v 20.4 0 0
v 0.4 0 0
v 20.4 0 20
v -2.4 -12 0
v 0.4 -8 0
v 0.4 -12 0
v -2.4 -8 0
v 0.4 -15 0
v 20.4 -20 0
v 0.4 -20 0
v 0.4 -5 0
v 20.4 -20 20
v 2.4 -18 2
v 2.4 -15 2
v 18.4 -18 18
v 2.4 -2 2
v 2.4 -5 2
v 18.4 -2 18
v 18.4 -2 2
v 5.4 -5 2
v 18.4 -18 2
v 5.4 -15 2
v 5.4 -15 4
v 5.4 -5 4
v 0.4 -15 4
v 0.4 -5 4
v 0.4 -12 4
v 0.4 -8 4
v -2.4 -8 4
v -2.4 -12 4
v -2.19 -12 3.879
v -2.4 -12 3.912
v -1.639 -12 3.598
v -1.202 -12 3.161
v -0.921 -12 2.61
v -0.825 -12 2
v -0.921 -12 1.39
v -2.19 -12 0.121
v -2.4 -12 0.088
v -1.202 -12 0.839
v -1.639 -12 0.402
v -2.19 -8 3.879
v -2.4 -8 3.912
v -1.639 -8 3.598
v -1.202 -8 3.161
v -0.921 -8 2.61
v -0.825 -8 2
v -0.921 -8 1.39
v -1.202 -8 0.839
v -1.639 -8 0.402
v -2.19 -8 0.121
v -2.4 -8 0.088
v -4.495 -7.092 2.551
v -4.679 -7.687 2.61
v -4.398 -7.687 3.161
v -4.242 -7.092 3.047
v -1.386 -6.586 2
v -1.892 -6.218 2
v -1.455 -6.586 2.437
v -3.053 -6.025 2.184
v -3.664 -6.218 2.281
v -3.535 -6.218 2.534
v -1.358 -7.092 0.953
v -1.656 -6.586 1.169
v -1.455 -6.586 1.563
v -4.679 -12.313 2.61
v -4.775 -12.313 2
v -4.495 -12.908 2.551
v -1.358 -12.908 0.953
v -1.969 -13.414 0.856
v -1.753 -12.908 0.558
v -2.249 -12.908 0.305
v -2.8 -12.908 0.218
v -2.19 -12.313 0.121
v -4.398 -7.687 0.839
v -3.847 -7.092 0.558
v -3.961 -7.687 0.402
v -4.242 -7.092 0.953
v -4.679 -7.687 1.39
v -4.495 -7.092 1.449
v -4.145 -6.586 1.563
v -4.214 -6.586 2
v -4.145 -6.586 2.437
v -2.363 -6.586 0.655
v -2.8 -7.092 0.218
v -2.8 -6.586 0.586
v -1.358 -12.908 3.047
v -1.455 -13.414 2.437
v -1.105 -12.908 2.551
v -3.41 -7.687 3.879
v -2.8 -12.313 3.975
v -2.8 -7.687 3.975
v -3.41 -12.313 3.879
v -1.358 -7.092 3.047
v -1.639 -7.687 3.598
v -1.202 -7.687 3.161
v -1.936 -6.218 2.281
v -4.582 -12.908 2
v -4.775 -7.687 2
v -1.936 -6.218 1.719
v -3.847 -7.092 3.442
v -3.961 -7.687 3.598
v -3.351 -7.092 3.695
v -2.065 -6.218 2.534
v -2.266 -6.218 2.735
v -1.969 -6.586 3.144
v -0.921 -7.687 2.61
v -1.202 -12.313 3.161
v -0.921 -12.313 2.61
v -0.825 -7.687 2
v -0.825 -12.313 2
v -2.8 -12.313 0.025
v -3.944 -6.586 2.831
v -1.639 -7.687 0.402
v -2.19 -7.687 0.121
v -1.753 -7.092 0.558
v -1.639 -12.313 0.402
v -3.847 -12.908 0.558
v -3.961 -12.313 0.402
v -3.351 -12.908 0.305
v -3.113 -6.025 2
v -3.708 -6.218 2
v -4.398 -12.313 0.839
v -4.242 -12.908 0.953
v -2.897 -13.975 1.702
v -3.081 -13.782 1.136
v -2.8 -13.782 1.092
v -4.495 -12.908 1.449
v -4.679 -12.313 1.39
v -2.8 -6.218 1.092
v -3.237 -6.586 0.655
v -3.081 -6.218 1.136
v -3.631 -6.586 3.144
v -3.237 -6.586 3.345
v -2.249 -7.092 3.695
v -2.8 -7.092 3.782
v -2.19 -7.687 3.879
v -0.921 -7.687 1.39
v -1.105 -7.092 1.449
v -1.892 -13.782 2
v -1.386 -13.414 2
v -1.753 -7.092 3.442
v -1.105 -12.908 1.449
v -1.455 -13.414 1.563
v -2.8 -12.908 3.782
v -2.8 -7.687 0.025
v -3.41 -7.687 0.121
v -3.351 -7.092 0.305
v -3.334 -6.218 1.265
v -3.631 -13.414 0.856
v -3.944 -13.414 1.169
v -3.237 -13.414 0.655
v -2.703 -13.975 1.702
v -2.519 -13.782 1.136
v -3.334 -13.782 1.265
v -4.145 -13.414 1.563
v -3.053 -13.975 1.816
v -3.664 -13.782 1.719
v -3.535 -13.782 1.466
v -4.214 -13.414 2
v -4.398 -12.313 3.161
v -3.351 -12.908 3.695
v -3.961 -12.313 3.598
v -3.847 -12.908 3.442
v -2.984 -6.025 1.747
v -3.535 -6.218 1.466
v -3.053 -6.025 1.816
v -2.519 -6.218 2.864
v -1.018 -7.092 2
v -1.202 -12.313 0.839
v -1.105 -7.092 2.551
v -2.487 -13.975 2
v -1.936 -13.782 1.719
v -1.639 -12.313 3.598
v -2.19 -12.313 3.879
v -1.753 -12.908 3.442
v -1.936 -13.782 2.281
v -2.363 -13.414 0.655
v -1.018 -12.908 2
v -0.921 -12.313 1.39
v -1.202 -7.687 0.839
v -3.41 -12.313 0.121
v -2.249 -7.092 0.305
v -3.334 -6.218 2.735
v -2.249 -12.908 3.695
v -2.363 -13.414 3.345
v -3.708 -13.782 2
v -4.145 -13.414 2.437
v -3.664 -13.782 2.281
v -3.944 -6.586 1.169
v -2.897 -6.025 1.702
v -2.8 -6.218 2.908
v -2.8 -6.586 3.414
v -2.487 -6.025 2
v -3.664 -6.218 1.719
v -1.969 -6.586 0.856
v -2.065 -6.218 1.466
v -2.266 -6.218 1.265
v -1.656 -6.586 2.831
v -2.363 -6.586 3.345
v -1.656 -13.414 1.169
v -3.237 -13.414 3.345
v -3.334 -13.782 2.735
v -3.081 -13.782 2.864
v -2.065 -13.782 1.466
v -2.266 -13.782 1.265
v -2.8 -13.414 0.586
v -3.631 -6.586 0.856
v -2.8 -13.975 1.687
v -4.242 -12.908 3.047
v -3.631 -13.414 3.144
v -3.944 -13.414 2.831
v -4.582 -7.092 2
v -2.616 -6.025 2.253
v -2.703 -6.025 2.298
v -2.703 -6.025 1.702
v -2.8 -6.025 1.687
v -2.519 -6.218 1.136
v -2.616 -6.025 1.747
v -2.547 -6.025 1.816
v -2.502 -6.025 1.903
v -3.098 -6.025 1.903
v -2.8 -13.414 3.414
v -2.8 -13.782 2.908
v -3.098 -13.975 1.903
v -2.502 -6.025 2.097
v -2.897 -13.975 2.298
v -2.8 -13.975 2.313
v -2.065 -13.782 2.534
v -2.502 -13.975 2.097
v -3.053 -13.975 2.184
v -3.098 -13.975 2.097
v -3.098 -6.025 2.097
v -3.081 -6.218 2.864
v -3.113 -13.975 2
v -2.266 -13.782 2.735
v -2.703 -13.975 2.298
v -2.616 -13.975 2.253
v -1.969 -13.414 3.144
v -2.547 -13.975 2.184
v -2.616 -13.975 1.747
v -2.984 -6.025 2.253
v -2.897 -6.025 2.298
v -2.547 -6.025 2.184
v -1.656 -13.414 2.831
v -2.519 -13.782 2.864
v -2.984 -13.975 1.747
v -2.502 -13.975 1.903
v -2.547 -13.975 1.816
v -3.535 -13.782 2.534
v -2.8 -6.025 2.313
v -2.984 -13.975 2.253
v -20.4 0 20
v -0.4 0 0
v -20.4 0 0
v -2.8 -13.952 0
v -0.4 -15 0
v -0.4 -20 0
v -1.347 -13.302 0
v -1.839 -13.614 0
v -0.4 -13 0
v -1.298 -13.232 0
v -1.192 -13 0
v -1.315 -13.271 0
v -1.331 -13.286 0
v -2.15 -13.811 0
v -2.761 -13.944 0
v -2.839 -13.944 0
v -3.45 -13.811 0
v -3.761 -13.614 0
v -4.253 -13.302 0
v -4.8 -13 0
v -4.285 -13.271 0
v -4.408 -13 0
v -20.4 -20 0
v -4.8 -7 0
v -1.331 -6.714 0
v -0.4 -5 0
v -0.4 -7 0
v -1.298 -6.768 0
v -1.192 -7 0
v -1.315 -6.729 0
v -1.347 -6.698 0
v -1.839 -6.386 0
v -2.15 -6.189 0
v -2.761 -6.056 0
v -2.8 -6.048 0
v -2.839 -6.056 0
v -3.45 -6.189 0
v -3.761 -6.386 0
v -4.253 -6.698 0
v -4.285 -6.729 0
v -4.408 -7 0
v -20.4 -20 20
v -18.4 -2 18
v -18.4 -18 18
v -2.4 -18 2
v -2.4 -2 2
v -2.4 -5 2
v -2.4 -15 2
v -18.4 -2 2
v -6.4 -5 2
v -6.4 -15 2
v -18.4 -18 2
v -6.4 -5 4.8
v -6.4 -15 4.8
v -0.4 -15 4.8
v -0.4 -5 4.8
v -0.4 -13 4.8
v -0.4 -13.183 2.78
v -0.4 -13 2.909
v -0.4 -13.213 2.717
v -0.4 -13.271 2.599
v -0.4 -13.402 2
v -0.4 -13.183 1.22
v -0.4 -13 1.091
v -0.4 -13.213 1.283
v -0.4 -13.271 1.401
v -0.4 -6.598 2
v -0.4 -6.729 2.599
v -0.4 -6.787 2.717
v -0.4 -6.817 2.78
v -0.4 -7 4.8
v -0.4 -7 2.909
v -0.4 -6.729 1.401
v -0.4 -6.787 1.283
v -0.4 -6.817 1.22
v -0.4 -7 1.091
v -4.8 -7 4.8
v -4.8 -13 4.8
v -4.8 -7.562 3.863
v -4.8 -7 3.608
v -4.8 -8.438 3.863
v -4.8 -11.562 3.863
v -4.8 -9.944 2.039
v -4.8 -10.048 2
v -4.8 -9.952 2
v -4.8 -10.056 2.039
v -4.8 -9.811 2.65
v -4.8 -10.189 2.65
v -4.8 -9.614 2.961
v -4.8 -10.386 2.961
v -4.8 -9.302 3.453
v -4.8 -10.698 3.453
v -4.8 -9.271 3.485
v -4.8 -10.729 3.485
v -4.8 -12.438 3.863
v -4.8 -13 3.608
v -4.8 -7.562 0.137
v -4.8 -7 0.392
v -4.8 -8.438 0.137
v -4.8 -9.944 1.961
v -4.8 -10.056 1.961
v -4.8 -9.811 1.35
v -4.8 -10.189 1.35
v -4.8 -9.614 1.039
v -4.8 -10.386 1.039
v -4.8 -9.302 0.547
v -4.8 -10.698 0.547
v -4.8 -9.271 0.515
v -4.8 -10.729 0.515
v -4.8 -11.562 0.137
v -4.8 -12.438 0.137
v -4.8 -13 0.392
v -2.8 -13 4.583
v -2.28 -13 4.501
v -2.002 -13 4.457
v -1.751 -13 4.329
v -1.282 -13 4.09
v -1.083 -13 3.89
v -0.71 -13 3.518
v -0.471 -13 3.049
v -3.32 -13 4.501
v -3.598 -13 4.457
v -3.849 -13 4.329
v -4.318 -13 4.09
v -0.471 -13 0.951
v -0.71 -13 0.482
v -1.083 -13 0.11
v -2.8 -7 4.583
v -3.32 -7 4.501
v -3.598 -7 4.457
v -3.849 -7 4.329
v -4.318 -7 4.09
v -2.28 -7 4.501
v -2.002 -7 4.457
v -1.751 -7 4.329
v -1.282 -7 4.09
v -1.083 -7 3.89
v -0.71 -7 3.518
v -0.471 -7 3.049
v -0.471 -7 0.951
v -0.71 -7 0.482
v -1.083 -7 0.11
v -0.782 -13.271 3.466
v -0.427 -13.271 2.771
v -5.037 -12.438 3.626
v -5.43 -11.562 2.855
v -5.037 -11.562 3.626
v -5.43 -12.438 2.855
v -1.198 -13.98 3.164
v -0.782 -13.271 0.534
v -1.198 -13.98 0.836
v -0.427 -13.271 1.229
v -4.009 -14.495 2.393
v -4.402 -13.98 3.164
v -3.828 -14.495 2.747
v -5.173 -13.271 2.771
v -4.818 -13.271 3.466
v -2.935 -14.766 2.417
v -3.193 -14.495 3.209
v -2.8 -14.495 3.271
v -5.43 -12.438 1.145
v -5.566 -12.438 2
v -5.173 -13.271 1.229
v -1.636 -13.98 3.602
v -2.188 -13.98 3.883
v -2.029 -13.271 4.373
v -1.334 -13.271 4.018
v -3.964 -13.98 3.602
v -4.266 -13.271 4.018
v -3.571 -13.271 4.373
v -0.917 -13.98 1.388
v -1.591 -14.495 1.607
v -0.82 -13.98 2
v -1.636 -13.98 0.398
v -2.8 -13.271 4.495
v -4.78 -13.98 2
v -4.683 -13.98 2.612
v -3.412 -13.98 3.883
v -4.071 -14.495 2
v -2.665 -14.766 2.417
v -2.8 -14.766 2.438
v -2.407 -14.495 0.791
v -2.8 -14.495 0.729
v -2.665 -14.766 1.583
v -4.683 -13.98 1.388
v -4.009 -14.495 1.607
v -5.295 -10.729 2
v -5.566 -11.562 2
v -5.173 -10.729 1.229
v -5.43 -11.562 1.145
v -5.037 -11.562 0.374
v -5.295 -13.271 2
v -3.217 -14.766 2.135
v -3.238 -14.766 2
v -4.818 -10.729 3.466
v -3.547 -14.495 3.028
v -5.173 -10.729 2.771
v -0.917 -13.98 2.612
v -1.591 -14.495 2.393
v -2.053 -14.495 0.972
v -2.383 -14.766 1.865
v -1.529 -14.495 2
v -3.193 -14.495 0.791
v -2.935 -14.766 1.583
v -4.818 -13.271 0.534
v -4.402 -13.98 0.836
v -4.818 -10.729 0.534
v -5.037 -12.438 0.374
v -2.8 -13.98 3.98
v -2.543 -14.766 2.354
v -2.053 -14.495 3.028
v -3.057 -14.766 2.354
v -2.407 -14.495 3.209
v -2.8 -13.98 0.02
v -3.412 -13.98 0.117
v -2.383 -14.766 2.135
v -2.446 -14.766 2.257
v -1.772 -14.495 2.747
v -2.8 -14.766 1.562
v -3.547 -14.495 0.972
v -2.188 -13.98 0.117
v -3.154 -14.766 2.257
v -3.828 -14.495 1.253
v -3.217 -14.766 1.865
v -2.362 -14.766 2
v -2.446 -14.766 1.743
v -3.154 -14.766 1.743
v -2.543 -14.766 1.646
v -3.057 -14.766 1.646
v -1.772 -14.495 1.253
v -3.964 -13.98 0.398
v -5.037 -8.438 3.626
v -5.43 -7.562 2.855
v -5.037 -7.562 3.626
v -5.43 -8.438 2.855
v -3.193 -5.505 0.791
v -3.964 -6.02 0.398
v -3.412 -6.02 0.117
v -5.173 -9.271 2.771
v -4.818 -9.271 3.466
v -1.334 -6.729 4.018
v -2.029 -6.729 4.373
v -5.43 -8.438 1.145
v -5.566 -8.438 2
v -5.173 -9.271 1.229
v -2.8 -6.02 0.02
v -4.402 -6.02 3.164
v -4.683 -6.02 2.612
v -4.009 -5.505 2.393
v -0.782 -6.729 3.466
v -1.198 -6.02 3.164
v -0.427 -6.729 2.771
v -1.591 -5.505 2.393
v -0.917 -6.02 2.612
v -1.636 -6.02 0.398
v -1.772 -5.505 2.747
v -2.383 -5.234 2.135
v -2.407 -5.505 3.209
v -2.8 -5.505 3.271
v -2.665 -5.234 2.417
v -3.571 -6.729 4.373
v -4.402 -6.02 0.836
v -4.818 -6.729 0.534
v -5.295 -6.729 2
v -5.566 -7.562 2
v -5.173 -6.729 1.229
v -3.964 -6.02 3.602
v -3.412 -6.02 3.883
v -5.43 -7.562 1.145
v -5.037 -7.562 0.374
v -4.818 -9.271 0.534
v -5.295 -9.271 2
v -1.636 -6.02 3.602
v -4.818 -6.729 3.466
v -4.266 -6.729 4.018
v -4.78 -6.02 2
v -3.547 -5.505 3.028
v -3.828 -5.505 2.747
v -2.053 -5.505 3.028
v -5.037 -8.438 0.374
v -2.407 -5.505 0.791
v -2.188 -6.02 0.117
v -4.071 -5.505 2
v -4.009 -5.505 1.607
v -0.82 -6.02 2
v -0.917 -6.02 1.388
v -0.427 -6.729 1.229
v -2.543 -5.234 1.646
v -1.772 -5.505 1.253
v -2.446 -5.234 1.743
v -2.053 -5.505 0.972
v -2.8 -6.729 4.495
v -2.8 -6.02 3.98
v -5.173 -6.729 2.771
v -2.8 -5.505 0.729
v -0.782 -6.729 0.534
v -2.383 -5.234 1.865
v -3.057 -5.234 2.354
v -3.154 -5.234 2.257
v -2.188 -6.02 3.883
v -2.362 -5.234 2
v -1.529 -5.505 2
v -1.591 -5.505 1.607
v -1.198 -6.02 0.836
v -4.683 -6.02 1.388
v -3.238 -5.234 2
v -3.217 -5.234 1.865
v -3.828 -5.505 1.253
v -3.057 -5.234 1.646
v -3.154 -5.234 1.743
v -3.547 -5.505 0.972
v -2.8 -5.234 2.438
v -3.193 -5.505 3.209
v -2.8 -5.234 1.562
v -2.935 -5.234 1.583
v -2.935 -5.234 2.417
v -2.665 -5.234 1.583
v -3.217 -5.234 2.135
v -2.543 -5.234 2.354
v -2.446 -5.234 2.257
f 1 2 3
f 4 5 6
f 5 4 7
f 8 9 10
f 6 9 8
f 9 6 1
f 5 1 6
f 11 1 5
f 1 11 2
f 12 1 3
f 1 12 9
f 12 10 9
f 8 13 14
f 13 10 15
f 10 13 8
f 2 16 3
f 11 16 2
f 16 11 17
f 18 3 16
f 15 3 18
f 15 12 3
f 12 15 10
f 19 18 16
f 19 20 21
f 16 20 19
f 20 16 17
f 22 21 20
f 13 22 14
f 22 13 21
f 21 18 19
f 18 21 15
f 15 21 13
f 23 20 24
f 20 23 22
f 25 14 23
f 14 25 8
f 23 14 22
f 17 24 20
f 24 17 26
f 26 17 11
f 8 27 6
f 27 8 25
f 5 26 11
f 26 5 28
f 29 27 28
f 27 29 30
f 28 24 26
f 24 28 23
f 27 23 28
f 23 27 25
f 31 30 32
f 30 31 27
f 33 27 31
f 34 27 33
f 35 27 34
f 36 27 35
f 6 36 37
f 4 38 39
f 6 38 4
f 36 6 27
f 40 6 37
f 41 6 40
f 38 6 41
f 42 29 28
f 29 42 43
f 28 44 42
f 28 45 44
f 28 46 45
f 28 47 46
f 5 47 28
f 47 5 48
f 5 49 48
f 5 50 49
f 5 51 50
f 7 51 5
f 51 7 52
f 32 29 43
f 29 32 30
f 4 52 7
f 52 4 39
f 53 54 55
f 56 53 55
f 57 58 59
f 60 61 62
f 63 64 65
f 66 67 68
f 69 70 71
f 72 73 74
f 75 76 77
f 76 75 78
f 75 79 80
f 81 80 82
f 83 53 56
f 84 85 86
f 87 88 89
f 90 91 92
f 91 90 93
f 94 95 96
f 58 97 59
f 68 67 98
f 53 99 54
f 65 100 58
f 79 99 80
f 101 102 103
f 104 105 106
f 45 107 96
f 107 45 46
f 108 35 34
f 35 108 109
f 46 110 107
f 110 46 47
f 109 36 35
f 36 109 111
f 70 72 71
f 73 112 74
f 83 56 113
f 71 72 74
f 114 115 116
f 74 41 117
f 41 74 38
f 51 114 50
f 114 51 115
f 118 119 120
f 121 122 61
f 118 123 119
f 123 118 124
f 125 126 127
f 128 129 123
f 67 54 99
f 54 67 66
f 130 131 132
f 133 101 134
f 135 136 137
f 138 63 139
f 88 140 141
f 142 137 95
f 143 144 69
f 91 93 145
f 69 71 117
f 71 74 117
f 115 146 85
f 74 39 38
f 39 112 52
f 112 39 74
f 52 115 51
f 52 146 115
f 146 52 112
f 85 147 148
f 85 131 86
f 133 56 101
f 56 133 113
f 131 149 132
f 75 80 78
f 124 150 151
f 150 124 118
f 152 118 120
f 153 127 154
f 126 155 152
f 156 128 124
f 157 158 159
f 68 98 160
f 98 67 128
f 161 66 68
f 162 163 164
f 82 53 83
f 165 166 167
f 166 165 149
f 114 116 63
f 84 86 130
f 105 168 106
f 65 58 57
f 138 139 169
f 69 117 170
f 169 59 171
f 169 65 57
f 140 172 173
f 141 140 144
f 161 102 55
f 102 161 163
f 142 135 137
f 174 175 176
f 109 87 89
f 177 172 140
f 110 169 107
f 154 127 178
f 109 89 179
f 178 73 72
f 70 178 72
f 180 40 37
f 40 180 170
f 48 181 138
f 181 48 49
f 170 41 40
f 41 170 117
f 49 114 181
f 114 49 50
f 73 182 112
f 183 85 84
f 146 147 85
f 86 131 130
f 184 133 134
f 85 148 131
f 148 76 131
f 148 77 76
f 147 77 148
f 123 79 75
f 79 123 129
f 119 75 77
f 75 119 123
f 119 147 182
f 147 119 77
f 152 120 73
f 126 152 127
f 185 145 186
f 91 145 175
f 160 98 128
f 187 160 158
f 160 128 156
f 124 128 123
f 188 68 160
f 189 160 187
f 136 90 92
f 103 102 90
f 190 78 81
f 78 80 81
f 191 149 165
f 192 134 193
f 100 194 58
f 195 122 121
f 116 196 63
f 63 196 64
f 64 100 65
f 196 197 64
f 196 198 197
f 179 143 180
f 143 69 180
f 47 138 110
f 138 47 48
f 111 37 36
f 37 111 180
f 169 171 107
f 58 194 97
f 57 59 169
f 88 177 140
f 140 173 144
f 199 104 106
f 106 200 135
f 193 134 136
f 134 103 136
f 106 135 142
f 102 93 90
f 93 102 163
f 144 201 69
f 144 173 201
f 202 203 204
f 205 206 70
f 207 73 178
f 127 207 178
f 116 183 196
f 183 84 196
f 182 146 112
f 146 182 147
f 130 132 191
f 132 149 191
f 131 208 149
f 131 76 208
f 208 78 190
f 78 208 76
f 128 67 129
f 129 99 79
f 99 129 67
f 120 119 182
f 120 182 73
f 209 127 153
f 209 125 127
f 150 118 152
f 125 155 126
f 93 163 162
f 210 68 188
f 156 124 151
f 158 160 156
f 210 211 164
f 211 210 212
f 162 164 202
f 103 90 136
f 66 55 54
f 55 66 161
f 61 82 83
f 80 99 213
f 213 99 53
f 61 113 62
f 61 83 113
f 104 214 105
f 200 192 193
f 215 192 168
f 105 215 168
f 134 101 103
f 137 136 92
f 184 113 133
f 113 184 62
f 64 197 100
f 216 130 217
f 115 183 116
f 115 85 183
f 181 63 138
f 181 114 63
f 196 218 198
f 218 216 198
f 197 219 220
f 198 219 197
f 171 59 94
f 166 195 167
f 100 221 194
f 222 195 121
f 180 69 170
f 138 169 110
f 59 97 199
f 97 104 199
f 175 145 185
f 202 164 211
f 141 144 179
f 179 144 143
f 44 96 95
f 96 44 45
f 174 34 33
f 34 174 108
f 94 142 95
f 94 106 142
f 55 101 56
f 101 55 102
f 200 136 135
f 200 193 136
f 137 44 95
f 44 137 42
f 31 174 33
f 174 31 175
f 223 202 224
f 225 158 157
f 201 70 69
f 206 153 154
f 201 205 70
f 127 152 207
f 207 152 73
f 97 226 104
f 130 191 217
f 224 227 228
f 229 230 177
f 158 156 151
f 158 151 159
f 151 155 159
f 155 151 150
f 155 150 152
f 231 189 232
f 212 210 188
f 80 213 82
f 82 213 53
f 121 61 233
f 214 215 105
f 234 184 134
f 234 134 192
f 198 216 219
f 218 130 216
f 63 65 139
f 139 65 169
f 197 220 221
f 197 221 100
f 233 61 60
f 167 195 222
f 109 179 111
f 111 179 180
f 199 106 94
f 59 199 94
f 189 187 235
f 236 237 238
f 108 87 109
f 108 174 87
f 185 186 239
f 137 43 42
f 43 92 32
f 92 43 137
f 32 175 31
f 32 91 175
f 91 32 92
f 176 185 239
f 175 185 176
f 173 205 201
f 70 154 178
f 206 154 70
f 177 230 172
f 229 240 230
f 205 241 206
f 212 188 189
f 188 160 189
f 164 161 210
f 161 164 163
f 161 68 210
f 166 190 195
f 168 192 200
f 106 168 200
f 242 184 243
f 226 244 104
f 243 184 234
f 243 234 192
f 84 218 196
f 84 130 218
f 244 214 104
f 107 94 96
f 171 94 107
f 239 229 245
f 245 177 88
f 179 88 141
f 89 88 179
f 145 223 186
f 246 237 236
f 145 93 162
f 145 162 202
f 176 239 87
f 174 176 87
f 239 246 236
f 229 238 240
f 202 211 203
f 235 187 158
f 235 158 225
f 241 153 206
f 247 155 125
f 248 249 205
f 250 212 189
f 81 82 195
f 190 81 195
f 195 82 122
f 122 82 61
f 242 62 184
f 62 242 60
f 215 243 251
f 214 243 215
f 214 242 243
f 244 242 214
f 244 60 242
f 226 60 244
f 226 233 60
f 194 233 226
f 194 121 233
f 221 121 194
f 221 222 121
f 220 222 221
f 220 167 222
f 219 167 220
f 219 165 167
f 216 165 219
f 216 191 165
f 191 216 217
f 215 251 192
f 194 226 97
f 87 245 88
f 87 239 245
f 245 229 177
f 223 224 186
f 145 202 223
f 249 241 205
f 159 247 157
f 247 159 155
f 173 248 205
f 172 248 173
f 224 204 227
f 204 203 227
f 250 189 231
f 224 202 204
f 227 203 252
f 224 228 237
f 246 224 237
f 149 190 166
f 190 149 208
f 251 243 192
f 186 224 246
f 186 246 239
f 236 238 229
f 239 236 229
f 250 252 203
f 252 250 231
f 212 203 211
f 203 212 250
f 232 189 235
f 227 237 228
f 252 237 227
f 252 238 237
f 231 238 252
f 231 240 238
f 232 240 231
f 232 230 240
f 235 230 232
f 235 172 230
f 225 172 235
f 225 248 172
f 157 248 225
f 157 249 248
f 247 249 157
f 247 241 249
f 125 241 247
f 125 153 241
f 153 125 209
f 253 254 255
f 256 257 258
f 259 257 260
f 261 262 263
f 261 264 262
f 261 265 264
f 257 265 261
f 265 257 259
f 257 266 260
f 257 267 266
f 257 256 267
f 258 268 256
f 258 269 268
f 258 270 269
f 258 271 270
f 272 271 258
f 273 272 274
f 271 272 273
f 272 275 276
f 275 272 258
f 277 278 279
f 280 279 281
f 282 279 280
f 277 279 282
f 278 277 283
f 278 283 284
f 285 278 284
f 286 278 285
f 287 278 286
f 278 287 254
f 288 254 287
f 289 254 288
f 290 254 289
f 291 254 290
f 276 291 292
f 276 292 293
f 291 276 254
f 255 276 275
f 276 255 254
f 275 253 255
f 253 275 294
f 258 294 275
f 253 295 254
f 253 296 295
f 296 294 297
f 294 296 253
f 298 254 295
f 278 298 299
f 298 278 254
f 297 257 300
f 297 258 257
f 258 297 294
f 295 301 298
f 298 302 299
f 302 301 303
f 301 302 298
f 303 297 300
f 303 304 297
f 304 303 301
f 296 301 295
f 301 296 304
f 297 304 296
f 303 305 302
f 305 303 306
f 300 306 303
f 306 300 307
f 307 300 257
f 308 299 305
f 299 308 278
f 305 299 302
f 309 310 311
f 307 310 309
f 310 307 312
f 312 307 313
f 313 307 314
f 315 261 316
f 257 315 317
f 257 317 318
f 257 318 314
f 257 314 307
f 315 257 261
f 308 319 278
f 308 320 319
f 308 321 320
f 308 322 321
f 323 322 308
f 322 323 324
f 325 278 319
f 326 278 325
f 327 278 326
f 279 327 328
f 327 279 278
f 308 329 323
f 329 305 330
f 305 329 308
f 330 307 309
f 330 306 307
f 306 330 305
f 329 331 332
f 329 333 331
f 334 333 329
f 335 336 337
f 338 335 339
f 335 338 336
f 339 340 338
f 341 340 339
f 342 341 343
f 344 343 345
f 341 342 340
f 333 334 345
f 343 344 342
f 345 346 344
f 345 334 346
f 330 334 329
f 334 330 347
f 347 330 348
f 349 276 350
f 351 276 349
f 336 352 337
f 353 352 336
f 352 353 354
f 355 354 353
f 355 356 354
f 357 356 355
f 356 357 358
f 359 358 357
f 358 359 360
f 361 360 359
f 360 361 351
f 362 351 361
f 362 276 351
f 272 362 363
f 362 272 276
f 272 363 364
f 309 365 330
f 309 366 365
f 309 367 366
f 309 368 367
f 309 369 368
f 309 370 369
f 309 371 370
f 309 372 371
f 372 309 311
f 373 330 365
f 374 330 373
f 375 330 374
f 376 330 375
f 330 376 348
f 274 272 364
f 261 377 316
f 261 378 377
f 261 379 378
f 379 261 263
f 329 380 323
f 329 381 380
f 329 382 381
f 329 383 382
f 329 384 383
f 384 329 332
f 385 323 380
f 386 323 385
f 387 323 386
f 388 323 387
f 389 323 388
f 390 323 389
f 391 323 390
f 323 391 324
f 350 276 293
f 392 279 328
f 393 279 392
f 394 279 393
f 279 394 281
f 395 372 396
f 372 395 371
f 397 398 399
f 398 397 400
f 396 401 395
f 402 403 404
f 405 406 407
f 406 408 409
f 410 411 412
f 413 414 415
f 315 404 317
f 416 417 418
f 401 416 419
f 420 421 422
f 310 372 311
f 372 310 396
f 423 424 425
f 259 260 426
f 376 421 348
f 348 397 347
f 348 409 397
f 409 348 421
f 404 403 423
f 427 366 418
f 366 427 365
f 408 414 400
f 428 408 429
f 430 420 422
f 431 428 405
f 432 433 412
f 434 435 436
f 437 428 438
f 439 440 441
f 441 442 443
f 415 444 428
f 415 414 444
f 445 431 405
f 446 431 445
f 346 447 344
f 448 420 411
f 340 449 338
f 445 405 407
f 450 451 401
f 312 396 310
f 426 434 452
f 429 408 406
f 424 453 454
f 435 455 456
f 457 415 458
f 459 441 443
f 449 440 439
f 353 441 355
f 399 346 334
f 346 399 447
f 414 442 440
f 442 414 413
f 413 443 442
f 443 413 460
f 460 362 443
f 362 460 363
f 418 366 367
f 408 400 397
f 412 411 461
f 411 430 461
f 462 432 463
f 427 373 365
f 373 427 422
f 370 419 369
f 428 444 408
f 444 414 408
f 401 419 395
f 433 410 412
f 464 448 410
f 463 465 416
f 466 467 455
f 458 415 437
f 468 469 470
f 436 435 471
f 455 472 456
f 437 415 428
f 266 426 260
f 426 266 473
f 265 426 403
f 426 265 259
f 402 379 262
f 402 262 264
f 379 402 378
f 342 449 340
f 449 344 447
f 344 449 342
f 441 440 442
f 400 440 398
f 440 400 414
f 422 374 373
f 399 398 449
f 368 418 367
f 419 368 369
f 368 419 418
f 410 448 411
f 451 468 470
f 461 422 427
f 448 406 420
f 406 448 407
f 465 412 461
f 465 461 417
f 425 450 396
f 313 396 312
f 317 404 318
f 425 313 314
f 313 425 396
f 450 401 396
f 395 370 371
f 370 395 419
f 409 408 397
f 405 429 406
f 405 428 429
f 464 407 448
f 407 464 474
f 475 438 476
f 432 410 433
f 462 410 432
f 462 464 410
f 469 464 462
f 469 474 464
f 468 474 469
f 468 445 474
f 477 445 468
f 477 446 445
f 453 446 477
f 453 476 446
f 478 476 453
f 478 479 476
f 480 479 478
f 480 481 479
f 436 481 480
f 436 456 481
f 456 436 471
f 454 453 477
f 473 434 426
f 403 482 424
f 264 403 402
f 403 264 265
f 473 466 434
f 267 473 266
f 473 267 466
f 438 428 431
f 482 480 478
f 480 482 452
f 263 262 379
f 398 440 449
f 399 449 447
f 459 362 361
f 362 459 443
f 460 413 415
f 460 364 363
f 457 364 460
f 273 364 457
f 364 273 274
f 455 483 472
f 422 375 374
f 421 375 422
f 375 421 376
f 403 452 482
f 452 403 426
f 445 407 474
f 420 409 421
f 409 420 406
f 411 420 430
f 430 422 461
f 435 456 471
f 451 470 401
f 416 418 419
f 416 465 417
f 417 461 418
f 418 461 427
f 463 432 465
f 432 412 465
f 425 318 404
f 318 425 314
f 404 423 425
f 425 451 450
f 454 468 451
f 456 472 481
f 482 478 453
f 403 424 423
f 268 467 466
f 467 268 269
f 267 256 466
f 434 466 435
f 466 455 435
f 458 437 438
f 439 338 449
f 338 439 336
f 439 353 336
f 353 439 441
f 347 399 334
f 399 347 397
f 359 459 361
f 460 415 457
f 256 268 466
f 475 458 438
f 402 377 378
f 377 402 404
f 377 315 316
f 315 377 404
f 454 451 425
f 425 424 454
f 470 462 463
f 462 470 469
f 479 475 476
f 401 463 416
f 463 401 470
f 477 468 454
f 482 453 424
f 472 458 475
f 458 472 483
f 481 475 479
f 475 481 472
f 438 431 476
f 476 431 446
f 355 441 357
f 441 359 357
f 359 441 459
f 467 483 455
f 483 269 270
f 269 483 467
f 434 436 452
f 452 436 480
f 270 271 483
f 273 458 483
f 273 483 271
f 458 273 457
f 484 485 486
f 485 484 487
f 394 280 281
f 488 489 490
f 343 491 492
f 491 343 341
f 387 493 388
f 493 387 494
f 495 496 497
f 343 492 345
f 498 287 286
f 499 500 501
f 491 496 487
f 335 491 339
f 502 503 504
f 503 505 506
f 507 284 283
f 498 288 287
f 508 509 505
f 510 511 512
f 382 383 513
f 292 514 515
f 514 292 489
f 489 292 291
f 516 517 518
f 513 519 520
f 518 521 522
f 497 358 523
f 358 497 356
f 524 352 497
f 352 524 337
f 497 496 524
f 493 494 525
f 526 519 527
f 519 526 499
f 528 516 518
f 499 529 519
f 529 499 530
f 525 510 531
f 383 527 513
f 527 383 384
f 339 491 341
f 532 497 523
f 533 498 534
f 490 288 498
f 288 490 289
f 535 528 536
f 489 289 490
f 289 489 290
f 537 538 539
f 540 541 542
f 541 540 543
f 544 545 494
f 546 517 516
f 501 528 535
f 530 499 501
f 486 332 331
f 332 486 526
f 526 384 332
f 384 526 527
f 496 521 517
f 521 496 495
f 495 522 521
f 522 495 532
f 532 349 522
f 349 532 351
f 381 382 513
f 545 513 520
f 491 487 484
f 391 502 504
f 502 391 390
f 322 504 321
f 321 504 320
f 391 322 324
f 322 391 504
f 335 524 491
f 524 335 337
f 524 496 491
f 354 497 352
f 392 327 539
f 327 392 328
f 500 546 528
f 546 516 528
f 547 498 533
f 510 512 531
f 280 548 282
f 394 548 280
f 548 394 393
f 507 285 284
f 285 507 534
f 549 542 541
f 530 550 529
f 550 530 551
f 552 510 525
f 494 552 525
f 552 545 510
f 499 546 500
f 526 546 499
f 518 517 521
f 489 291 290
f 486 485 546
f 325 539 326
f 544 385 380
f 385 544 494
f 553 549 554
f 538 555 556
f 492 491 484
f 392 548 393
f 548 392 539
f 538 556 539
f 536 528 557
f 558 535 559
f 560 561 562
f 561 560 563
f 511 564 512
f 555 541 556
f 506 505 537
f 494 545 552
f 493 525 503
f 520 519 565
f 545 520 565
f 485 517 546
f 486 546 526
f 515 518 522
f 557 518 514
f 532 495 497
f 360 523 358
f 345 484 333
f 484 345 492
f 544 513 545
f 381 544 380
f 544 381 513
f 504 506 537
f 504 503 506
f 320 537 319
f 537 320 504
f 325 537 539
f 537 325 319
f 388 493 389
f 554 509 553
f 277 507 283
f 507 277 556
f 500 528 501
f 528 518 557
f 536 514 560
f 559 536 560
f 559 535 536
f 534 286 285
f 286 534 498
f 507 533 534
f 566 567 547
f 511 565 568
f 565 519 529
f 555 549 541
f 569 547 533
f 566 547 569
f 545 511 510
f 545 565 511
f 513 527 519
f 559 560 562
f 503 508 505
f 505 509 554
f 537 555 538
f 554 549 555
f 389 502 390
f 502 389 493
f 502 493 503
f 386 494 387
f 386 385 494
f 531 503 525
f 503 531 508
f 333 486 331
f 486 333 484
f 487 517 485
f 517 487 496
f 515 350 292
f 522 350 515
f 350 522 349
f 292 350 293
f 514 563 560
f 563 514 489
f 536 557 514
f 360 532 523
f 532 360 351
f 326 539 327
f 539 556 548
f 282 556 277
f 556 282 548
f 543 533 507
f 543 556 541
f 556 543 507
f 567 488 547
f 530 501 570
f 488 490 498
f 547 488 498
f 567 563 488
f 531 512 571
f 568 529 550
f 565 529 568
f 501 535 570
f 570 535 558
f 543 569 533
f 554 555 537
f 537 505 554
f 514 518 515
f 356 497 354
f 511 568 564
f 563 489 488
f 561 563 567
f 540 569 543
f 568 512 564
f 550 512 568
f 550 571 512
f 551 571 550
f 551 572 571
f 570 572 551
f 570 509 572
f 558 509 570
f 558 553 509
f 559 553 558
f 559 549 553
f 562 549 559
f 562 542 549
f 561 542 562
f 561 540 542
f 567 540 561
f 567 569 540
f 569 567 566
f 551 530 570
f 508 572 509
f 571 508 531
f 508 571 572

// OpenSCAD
l=20;
w=20;
h=20;
a=2; // wall width 
t=0.8; // tolerance of joint

module box_side(l,w,h,a,clasp){
    difference(){
        union(){
            translate([t/2,0,0]){
                difference(){
                    linear_extrude(height=h){
                        polygon(points=[[0,0],[l,0],[l,w]]);
                    }
                    translate([-a,a,a]){
                        linear_extrude(height=h-(a*2)){
                            polygon(points=[[0,0],[l,0],[l,w]]);
                        }
                    }
                }
                translate([0,0,h/4]){
                    if(clasp=="M"){
                        cube([a*2.5,a*2,h/2]);
                    }
                    if(clasp=="F"){
                        cube([a*3,a*2+t,h/2]);
                    }
                }
            }
            if(clasp=="M"){
   
                translate([0,a,h/2]){
                    cube([a*2+t,a*2,a*2],center=true);
                    hull(){
                        translate([-a-t,0,a]){
                            sphere(r=a,$fn=20);
                        }
                        translate([-a-t,0,-a]){
                            sphere(r=a,$fn=20);
                        }
                    }
                }

            }       
        }
        if(clasp=="F"){
            translate([t,a,h/2]){
                cube([a*4,a*3+t*2,a*3],center=true);
                translate([a,0,a]){
                    sphere(r=a+t,$fn=20);
                }
                translate([a,0,-a]){
                    sphere(r=a+t,$fn=20);
                }
            }
        }
    }
}

rotate([90,0,0]){
    box_side(l,w,h,a,"M");
    mirror([1,0,0])
        box_side(l,w,h,a,"F");
}
